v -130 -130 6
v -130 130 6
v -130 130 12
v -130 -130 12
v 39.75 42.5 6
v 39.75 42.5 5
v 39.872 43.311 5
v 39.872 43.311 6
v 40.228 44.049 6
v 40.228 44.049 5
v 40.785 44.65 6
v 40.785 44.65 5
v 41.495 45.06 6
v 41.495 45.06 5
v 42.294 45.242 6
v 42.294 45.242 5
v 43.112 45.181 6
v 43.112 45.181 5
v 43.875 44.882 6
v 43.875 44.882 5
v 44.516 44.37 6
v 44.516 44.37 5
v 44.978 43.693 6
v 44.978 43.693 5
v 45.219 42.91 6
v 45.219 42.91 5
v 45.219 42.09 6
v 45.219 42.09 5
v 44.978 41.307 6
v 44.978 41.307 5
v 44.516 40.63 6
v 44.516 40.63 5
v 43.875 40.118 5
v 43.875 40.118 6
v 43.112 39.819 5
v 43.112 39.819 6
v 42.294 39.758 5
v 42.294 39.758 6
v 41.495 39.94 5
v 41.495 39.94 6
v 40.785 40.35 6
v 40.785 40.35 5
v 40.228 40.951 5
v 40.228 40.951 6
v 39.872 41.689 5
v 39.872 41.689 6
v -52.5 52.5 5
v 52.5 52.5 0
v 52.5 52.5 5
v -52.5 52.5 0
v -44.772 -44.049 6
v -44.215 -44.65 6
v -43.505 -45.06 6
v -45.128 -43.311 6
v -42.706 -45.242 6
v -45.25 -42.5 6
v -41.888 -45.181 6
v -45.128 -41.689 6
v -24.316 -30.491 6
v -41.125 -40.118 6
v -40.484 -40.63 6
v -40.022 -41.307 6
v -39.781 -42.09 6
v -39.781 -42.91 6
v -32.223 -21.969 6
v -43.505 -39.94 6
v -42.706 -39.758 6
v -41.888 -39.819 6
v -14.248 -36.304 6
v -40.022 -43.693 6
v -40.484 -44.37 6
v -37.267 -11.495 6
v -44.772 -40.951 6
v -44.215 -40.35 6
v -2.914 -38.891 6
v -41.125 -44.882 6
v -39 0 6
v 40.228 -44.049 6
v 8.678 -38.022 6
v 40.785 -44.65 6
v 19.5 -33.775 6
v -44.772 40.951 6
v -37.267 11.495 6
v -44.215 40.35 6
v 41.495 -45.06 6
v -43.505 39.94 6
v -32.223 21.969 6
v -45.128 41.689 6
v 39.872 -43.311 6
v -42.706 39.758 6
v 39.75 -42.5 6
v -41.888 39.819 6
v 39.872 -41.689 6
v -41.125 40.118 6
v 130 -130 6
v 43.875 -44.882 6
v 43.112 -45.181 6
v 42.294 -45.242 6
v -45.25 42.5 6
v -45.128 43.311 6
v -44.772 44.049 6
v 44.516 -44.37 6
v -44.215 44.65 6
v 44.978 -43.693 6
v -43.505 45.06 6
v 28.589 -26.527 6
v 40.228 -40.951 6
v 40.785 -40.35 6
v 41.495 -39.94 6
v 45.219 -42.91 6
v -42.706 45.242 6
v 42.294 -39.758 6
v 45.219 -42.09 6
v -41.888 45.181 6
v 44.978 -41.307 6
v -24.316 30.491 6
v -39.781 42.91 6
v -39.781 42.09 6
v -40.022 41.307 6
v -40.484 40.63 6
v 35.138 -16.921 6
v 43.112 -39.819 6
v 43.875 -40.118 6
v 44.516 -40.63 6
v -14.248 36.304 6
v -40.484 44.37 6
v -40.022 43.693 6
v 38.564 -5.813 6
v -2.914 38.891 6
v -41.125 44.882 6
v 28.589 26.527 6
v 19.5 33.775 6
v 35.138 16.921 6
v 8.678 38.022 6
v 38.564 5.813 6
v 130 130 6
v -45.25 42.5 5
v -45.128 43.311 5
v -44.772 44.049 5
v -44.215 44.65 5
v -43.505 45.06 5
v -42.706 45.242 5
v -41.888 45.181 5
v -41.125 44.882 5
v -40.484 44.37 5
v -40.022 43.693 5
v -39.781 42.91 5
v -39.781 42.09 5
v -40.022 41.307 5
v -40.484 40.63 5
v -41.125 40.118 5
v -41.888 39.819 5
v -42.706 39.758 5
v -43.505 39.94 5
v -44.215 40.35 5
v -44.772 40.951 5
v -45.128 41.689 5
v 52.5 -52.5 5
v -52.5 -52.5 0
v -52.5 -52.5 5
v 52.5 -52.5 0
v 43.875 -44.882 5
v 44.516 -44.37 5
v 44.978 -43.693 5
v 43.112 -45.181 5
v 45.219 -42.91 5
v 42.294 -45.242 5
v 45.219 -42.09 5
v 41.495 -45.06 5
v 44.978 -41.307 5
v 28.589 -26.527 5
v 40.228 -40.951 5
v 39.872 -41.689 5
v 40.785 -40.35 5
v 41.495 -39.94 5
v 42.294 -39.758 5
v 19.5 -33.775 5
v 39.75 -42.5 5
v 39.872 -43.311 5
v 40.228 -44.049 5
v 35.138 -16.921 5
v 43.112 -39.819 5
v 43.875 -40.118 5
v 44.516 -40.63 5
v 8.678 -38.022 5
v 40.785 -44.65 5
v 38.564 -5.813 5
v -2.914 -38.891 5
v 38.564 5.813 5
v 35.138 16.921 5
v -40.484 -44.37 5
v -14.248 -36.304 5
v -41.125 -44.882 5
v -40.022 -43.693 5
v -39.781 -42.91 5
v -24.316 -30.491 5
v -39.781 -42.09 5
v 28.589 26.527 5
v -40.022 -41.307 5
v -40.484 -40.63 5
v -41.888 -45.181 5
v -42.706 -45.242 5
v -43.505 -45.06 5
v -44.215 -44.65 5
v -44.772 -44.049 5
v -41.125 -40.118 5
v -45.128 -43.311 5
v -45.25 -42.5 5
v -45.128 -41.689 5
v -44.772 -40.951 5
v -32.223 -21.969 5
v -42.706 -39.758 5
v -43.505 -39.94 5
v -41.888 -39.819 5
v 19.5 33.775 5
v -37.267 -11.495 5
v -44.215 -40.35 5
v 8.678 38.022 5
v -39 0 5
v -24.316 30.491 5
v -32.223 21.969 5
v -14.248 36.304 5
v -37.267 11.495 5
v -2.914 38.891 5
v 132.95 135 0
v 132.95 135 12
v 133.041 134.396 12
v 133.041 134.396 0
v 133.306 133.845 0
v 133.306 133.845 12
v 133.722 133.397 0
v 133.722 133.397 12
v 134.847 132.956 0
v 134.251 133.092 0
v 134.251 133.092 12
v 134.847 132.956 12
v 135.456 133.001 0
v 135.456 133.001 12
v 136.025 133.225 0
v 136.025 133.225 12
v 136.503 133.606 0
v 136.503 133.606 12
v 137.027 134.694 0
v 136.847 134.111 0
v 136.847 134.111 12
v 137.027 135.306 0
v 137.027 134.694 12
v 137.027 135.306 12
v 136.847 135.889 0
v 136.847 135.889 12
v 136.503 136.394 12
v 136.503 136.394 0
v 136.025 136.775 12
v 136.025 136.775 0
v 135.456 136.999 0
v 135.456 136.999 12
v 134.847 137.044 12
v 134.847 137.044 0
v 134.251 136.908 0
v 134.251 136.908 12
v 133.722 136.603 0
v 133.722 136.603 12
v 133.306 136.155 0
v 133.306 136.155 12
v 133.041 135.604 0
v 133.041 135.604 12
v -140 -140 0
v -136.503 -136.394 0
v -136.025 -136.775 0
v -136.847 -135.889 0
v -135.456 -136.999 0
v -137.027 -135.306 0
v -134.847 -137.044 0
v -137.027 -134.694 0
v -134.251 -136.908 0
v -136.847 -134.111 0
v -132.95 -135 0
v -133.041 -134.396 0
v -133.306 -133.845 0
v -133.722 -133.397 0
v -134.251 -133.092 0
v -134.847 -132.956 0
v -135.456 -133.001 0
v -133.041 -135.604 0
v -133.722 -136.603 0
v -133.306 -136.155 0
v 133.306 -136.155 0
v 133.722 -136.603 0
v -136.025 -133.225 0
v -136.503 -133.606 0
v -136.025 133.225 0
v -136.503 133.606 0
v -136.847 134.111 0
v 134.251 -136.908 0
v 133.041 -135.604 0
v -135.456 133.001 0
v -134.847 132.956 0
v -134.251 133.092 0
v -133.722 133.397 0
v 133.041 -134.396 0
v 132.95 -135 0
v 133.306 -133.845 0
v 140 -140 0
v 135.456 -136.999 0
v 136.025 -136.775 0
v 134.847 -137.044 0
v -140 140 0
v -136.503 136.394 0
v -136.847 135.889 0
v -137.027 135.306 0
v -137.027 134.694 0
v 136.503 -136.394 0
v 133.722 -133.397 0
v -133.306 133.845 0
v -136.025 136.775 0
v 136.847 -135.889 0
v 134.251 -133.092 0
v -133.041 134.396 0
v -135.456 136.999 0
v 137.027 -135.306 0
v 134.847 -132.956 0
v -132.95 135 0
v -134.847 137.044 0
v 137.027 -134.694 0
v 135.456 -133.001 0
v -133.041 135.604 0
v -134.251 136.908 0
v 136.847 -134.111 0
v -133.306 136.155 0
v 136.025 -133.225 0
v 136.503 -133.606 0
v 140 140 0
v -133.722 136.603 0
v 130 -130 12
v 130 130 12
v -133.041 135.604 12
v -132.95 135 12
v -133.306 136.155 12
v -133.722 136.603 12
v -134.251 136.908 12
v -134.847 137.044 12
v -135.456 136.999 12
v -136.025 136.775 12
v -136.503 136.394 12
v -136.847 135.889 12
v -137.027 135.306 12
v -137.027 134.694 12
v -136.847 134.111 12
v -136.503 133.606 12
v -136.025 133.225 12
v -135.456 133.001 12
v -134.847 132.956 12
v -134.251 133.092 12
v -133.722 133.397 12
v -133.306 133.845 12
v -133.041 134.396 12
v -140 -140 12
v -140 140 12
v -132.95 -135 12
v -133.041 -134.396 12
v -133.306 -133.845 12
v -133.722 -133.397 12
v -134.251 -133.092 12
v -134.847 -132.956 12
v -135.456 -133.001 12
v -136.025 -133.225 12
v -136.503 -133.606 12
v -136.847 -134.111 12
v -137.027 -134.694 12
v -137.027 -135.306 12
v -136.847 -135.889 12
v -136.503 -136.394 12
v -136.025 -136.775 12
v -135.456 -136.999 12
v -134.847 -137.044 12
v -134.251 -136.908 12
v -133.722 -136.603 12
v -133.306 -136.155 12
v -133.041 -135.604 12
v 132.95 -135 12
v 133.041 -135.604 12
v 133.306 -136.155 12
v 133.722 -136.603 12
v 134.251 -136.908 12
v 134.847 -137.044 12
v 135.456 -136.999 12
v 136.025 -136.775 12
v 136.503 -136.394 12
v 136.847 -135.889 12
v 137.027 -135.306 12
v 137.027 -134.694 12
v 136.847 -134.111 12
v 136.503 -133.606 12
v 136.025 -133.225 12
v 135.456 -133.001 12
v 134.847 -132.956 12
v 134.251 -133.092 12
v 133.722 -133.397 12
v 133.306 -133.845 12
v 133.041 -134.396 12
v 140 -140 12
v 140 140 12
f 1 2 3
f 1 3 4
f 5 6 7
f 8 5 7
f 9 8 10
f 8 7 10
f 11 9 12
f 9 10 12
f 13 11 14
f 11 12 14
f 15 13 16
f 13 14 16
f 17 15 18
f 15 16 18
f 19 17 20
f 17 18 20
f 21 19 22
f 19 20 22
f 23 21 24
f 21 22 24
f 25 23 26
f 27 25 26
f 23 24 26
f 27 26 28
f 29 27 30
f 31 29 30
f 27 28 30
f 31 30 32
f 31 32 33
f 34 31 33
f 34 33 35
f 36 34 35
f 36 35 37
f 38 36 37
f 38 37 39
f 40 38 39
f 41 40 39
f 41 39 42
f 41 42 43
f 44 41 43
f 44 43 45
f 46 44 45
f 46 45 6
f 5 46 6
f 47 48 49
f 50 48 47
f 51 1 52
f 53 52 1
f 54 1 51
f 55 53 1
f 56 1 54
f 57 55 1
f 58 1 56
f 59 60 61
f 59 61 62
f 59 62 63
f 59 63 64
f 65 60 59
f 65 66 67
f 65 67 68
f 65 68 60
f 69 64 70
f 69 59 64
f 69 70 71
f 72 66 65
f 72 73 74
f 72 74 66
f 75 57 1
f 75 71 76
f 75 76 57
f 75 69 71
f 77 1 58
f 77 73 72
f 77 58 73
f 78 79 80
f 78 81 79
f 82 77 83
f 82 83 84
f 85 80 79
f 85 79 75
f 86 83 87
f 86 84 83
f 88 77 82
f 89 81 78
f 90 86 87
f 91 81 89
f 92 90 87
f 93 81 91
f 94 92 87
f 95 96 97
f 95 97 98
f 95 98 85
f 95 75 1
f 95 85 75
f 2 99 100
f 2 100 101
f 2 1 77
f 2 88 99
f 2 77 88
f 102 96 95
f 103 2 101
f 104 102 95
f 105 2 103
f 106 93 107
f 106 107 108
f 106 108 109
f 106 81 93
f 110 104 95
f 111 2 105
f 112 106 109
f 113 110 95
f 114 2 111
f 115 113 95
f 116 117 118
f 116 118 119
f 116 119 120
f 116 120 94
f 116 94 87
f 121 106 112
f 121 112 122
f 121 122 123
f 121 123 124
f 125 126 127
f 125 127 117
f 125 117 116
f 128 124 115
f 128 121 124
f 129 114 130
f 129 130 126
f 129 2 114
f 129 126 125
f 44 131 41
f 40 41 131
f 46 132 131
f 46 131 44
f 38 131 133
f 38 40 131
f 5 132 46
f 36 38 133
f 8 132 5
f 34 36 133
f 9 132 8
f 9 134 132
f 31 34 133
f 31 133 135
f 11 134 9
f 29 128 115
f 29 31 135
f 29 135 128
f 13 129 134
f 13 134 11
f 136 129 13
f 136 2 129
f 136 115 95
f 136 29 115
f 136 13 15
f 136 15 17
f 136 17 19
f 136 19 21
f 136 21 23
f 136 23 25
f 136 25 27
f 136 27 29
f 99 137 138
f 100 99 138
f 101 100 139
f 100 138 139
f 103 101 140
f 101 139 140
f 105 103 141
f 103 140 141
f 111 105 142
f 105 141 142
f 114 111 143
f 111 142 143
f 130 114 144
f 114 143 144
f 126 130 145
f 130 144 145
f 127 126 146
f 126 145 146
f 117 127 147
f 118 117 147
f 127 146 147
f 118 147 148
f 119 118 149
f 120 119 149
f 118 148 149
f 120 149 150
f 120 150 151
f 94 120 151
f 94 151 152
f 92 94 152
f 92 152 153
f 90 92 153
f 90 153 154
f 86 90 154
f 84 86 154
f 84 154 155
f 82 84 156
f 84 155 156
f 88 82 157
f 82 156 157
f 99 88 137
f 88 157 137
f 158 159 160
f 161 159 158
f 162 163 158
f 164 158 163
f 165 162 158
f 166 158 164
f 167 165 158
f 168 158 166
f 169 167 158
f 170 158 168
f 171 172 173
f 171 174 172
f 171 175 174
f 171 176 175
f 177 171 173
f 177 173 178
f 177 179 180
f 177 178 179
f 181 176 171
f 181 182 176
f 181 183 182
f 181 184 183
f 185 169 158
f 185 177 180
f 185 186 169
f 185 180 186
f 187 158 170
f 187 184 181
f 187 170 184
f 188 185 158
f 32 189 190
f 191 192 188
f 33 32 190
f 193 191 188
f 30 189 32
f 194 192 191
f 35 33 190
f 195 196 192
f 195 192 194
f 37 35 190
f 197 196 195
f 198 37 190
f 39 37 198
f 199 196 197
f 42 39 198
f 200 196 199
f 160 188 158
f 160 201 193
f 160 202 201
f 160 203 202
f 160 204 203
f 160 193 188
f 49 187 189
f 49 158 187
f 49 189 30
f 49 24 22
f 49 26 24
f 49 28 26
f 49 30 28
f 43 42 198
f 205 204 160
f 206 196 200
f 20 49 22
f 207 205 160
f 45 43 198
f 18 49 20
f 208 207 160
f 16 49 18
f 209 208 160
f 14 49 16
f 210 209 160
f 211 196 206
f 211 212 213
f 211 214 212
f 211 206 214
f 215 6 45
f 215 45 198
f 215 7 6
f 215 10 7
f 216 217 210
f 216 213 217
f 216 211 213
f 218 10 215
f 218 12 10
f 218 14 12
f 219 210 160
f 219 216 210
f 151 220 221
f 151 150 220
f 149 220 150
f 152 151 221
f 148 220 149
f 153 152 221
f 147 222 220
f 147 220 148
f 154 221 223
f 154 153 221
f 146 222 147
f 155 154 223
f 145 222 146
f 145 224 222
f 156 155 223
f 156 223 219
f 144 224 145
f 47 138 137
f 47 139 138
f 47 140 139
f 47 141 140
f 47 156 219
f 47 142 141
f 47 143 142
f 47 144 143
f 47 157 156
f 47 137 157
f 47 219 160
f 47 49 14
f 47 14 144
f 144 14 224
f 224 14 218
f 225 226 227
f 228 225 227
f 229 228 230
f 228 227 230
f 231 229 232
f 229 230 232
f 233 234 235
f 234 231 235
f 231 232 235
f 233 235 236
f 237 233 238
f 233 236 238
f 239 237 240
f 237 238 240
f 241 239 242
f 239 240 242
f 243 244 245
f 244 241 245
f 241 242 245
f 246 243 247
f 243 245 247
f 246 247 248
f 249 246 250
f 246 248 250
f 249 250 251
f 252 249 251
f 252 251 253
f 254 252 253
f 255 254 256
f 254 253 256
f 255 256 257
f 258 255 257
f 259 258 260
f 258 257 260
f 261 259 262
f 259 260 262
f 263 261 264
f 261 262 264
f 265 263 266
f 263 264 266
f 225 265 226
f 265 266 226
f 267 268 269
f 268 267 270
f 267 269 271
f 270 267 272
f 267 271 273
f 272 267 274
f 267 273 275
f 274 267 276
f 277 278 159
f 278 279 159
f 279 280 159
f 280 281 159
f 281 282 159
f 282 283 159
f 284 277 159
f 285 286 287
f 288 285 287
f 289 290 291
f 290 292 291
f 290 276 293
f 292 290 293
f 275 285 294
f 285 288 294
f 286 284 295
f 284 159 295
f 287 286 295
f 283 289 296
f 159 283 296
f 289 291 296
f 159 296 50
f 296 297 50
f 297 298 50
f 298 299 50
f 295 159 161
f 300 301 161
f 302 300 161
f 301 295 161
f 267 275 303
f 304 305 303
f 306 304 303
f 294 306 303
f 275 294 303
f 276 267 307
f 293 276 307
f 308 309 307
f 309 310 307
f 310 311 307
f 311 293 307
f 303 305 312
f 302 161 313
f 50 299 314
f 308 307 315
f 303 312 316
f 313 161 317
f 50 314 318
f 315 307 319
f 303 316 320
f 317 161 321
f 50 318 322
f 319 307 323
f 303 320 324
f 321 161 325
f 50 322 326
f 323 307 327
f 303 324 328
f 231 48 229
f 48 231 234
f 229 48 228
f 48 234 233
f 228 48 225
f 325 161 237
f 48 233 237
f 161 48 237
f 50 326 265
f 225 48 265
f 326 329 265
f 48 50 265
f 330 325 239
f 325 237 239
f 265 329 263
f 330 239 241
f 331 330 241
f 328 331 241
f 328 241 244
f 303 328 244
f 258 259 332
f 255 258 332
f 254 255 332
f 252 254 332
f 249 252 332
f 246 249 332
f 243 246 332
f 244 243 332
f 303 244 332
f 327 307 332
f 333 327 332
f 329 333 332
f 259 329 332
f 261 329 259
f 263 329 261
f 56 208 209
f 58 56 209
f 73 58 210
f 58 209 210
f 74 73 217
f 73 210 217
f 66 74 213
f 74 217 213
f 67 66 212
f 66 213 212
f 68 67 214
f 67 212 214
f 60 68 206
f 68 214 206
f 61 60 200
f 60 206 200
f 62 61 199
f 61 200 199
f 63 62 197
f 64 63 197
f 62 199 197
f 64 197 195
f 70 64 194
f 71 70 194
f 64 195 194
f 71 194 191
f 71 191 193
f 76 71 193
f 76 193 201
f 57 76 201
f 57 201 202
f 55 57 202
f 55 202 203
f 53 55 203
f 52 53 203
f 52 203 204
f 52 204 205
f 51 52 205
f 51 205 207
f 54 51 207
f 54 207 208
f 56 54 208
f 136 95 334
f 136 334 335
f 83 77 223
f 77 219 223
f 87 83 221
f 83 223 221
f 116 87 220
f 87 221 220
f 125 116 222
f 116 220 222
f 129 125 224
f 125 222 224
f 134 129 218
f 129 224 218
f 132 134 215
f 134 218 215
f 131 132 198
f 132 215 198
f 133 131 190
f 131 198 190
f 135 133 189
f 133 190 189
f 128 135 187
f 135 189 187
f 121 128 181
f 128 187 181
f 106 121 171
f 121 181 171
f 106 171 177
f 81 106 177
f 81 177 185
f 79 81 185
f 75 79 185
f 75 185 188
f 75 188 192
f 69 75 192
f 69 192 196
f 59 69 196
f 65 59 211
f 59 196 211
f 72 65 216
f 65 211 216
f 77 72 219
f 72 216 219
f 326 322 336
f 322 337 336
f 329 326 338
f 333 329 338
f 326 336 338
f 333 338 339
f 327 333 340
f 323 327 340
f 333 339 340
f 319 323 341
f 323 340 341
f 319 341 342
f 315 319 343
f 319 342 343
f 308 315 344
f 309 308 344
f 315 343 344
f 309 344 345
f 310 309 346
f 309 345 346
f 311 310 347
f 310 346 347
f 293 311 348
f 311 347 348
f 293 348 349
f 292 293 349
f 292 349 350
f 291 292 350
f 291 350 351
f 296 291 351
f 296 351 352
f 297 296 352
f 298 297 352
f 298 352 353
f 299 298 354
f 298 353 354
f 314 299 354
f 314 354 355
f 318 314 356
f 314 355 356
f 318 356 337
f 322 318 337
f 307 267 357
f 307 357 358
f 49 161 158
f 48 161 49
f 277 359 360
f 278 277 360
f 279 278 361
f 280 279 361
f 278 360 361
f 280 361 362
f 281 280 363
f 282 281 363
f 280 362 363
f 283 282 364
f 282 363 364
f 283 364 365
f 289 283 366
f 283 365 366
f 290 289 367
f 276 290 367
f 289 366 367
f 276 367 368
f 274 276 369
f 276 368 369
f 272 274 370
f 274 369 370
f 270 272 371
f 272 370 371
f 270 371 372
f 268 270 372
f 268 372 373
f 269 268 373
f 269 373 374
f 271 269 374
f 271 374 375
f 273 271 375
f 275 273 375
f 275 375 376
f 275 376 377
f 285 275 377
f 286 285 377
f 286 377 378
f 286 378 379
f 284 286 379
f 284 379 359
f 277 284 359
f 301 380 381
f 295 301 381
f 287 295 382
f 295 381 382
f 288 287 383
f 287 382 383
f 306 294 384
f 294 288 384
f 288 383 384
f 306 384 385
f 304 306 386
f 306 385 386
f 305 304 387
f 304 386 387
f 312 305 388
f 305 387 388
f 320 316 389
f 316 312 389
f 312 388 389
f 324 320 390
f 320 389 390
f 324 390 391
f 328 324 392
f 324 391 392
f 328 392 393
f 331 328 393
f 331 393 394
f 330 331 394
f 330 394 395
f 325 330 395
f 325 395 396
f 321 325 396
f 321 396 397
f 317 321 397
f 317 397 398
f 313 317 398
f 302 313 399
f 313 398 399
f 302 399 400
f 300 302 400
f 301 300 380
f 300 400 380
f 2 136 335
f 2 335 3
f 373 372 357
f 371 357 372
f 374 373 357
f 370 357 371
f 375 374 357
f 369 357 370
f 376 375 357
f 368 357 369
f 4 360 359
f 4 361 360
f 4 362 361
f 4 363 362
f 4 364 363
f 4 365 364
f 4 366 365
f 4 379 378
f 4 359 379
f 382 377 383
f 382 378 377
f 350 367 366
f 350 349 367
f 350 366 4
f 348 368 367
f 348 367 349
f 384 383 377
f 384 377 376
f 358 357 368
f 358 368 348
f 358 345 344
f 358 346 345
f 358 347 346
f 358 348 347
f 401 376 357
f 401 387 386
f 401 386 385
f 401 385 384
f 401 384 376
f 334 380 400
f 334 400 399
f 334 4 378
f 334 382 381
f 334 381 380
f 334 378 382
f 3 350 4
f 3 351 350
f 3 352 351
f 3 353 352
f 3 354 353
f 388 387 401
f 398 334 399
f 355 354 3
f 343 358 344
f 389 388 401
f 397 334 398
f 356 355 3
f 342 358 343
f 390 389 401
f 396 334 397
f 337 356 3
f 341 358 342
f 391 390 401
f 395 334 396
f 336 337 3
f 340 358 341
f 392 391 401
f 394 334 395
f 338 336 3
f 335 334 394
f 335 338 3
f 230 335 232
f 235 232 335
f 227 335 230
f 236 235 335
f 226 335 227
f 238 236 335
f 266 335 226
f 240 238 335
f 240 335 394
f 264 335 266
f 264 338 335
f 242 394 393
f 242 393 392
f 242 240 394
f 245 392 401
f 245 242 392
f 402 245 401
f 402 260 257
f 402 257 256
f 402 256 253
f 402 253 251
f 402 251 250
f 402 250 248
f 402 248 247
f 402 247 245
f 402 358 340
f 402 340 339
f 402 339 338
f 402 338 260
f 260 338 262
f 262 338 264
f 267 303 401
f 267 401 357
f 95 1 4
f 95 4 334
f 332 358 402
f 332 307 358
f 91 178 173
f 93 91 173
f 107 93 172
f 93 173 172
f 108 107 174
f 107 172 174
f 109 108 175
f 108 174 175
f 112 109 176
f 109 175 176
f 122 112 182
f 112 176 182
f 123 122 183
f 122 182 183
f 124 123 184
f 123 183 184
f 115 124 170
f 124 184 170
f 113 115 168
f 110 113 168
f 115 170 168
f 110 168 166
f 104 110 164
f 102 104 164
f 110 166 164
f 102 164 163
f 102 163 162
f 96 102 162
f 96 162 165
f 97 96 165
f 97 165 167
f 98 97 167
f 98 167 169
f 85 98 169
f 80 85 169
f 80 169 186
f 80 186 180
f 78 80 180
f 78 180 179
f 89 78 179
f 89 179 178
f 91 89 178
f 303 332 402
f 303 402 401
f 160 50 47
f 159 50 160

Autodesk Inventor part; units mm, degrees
ref_plane "YZ Plane" through (0, 0, 0) normal (1, 0, 0) x (0, 1, 0)
ref_plane "XZ Plane" through (0, 0, 0) normal (0, 1, 0) x (-1, 0, 0)
ref_plane "XY Plane" through (0, 0, 0) normal (0, 0, 1) x (1, 0, 0)
sketch "Sketch1" plane through (0, 0, 0) normal (0, 0, 1) x (1, 0, 0)
  line L0 (-140, 140) -> (140, 140)
  line L1 (140, 140) -> (140, -140)
  line L2 (140, -140) -> (-140, -140)
  line L3 (-140, -140) -> (-140, 140)
  point P0 (0, 0)
  point P1 (0, 140)
  point P2 (140, 0)
  dimension "d0" = 280
  dimension "d1" = 280
extrude "Extrusion1" add sketch "Sketch1" along normal blind 6
sketch "Sketch2" plane through (0, 0, 6) normal (0, 0, 1) x (1, 0, 0)
  line L0 (140, 140) -> (-140, 140)
  line L1 (-140, 140) -> (-140, -140)
  line L2 (-140, -140) -> (140, -140)
  line L3 (140, -140) -> (140, 140)
  line L4 (130, 130) -> (-130, 130)
  line L5 (-130, 130) -> (-130, -130)
  line L6 (-130, -130) -> (130, -130)
  line L7 (130, -130) -> (130, 130)
  point P0 (0, 0)
  dimension "d4" = 10
extrude "Extrusion2" add sketch "Sketch2" along normal blind 6
sketch "Sketch3" plane through (0, 0, 12) normal (0, 0, 1) x (1, 0, 0)
  circle A0 centre (-135, -135) radius 2.05
  circle A1 centre (-135, 135) radius 2.05
  line L0 (-135, 135) -> (-135, -135) construction
  line L1 (-140, 140) -> (-140, -140) construction
  line L2 (-140, -140) -> (140, -140) construction
  point P0 (0, 0)
  point P1 (-135, 0)
  point P2 (-140, 0)
  dimension "d7" = 4.1
  dimension "d8" = 4.1
  dimension "d9" = 5
  dimension "d10" = 5
extrude "Extrusion3" cut sketch "Sketch3" against normal up to surface (12 mm away)
mirror "Mirror1" about plane through (0, 0, 0) normal (1, 0, 0) of "Extrusion3"
sketch "Sketch4" plane through (0, 0, 0) normal (0, 0, -1) x (-1, 0, 0)
  line L0 (-52.5, 52.5) -> (52.5, 52.5)
  line L1 (52.5, 52.5) -> (52.5, -52.5)
  line L2 (52.5, -52.5) -> (-52.5, -52.5)
  line L3 (-52.5, -52.5) -> (-52.5, 52.5)
  point P0 (0, 0)
  point P1 (52.5, 0)
  point P2 (0, 52.5)
  dimension "d13" = 105
  dimension "d14" = 105
extrude "Extrusion4" cut sketch "Sketch4" against normal blind 5
sketch "Sketch5" plane through (0, 0, 5) normal (0, 0, -1) x (-1, 0, 0)
  circle A0 centre (0, 0) radius 39
  dimension "d17" = 78
extrude "Extrusion5" cut sketch "Sketch5" against normal blind 5
sketch "Sketch6" plane through (0, 0, 5) normal (0, 0, -1) x (-1, 0, 0)
  circle A0 centre (-42.5, 42.5) radius 2.75
  line L0 (-52.5, 52.5) -> (52.5, 52.5) projected
  line L1 (-52.5, -52.5) -> (-52.5, 52.5) projected
  point P0 (0, 0)
  dimension "d27" = 5.5
  dimension "d28" = 10
  dimension "d29" = 10
extrude "Extrusion6" cut sketch "Sketch6" against normal blind 5
pattern_linear "Rectangular Pattern1" count 2 spacing 85 along (0, -1, 0) count 2 spacing 85 along (-1, 0, 0) of "Extrusion6"
properties part number "brain box top"
